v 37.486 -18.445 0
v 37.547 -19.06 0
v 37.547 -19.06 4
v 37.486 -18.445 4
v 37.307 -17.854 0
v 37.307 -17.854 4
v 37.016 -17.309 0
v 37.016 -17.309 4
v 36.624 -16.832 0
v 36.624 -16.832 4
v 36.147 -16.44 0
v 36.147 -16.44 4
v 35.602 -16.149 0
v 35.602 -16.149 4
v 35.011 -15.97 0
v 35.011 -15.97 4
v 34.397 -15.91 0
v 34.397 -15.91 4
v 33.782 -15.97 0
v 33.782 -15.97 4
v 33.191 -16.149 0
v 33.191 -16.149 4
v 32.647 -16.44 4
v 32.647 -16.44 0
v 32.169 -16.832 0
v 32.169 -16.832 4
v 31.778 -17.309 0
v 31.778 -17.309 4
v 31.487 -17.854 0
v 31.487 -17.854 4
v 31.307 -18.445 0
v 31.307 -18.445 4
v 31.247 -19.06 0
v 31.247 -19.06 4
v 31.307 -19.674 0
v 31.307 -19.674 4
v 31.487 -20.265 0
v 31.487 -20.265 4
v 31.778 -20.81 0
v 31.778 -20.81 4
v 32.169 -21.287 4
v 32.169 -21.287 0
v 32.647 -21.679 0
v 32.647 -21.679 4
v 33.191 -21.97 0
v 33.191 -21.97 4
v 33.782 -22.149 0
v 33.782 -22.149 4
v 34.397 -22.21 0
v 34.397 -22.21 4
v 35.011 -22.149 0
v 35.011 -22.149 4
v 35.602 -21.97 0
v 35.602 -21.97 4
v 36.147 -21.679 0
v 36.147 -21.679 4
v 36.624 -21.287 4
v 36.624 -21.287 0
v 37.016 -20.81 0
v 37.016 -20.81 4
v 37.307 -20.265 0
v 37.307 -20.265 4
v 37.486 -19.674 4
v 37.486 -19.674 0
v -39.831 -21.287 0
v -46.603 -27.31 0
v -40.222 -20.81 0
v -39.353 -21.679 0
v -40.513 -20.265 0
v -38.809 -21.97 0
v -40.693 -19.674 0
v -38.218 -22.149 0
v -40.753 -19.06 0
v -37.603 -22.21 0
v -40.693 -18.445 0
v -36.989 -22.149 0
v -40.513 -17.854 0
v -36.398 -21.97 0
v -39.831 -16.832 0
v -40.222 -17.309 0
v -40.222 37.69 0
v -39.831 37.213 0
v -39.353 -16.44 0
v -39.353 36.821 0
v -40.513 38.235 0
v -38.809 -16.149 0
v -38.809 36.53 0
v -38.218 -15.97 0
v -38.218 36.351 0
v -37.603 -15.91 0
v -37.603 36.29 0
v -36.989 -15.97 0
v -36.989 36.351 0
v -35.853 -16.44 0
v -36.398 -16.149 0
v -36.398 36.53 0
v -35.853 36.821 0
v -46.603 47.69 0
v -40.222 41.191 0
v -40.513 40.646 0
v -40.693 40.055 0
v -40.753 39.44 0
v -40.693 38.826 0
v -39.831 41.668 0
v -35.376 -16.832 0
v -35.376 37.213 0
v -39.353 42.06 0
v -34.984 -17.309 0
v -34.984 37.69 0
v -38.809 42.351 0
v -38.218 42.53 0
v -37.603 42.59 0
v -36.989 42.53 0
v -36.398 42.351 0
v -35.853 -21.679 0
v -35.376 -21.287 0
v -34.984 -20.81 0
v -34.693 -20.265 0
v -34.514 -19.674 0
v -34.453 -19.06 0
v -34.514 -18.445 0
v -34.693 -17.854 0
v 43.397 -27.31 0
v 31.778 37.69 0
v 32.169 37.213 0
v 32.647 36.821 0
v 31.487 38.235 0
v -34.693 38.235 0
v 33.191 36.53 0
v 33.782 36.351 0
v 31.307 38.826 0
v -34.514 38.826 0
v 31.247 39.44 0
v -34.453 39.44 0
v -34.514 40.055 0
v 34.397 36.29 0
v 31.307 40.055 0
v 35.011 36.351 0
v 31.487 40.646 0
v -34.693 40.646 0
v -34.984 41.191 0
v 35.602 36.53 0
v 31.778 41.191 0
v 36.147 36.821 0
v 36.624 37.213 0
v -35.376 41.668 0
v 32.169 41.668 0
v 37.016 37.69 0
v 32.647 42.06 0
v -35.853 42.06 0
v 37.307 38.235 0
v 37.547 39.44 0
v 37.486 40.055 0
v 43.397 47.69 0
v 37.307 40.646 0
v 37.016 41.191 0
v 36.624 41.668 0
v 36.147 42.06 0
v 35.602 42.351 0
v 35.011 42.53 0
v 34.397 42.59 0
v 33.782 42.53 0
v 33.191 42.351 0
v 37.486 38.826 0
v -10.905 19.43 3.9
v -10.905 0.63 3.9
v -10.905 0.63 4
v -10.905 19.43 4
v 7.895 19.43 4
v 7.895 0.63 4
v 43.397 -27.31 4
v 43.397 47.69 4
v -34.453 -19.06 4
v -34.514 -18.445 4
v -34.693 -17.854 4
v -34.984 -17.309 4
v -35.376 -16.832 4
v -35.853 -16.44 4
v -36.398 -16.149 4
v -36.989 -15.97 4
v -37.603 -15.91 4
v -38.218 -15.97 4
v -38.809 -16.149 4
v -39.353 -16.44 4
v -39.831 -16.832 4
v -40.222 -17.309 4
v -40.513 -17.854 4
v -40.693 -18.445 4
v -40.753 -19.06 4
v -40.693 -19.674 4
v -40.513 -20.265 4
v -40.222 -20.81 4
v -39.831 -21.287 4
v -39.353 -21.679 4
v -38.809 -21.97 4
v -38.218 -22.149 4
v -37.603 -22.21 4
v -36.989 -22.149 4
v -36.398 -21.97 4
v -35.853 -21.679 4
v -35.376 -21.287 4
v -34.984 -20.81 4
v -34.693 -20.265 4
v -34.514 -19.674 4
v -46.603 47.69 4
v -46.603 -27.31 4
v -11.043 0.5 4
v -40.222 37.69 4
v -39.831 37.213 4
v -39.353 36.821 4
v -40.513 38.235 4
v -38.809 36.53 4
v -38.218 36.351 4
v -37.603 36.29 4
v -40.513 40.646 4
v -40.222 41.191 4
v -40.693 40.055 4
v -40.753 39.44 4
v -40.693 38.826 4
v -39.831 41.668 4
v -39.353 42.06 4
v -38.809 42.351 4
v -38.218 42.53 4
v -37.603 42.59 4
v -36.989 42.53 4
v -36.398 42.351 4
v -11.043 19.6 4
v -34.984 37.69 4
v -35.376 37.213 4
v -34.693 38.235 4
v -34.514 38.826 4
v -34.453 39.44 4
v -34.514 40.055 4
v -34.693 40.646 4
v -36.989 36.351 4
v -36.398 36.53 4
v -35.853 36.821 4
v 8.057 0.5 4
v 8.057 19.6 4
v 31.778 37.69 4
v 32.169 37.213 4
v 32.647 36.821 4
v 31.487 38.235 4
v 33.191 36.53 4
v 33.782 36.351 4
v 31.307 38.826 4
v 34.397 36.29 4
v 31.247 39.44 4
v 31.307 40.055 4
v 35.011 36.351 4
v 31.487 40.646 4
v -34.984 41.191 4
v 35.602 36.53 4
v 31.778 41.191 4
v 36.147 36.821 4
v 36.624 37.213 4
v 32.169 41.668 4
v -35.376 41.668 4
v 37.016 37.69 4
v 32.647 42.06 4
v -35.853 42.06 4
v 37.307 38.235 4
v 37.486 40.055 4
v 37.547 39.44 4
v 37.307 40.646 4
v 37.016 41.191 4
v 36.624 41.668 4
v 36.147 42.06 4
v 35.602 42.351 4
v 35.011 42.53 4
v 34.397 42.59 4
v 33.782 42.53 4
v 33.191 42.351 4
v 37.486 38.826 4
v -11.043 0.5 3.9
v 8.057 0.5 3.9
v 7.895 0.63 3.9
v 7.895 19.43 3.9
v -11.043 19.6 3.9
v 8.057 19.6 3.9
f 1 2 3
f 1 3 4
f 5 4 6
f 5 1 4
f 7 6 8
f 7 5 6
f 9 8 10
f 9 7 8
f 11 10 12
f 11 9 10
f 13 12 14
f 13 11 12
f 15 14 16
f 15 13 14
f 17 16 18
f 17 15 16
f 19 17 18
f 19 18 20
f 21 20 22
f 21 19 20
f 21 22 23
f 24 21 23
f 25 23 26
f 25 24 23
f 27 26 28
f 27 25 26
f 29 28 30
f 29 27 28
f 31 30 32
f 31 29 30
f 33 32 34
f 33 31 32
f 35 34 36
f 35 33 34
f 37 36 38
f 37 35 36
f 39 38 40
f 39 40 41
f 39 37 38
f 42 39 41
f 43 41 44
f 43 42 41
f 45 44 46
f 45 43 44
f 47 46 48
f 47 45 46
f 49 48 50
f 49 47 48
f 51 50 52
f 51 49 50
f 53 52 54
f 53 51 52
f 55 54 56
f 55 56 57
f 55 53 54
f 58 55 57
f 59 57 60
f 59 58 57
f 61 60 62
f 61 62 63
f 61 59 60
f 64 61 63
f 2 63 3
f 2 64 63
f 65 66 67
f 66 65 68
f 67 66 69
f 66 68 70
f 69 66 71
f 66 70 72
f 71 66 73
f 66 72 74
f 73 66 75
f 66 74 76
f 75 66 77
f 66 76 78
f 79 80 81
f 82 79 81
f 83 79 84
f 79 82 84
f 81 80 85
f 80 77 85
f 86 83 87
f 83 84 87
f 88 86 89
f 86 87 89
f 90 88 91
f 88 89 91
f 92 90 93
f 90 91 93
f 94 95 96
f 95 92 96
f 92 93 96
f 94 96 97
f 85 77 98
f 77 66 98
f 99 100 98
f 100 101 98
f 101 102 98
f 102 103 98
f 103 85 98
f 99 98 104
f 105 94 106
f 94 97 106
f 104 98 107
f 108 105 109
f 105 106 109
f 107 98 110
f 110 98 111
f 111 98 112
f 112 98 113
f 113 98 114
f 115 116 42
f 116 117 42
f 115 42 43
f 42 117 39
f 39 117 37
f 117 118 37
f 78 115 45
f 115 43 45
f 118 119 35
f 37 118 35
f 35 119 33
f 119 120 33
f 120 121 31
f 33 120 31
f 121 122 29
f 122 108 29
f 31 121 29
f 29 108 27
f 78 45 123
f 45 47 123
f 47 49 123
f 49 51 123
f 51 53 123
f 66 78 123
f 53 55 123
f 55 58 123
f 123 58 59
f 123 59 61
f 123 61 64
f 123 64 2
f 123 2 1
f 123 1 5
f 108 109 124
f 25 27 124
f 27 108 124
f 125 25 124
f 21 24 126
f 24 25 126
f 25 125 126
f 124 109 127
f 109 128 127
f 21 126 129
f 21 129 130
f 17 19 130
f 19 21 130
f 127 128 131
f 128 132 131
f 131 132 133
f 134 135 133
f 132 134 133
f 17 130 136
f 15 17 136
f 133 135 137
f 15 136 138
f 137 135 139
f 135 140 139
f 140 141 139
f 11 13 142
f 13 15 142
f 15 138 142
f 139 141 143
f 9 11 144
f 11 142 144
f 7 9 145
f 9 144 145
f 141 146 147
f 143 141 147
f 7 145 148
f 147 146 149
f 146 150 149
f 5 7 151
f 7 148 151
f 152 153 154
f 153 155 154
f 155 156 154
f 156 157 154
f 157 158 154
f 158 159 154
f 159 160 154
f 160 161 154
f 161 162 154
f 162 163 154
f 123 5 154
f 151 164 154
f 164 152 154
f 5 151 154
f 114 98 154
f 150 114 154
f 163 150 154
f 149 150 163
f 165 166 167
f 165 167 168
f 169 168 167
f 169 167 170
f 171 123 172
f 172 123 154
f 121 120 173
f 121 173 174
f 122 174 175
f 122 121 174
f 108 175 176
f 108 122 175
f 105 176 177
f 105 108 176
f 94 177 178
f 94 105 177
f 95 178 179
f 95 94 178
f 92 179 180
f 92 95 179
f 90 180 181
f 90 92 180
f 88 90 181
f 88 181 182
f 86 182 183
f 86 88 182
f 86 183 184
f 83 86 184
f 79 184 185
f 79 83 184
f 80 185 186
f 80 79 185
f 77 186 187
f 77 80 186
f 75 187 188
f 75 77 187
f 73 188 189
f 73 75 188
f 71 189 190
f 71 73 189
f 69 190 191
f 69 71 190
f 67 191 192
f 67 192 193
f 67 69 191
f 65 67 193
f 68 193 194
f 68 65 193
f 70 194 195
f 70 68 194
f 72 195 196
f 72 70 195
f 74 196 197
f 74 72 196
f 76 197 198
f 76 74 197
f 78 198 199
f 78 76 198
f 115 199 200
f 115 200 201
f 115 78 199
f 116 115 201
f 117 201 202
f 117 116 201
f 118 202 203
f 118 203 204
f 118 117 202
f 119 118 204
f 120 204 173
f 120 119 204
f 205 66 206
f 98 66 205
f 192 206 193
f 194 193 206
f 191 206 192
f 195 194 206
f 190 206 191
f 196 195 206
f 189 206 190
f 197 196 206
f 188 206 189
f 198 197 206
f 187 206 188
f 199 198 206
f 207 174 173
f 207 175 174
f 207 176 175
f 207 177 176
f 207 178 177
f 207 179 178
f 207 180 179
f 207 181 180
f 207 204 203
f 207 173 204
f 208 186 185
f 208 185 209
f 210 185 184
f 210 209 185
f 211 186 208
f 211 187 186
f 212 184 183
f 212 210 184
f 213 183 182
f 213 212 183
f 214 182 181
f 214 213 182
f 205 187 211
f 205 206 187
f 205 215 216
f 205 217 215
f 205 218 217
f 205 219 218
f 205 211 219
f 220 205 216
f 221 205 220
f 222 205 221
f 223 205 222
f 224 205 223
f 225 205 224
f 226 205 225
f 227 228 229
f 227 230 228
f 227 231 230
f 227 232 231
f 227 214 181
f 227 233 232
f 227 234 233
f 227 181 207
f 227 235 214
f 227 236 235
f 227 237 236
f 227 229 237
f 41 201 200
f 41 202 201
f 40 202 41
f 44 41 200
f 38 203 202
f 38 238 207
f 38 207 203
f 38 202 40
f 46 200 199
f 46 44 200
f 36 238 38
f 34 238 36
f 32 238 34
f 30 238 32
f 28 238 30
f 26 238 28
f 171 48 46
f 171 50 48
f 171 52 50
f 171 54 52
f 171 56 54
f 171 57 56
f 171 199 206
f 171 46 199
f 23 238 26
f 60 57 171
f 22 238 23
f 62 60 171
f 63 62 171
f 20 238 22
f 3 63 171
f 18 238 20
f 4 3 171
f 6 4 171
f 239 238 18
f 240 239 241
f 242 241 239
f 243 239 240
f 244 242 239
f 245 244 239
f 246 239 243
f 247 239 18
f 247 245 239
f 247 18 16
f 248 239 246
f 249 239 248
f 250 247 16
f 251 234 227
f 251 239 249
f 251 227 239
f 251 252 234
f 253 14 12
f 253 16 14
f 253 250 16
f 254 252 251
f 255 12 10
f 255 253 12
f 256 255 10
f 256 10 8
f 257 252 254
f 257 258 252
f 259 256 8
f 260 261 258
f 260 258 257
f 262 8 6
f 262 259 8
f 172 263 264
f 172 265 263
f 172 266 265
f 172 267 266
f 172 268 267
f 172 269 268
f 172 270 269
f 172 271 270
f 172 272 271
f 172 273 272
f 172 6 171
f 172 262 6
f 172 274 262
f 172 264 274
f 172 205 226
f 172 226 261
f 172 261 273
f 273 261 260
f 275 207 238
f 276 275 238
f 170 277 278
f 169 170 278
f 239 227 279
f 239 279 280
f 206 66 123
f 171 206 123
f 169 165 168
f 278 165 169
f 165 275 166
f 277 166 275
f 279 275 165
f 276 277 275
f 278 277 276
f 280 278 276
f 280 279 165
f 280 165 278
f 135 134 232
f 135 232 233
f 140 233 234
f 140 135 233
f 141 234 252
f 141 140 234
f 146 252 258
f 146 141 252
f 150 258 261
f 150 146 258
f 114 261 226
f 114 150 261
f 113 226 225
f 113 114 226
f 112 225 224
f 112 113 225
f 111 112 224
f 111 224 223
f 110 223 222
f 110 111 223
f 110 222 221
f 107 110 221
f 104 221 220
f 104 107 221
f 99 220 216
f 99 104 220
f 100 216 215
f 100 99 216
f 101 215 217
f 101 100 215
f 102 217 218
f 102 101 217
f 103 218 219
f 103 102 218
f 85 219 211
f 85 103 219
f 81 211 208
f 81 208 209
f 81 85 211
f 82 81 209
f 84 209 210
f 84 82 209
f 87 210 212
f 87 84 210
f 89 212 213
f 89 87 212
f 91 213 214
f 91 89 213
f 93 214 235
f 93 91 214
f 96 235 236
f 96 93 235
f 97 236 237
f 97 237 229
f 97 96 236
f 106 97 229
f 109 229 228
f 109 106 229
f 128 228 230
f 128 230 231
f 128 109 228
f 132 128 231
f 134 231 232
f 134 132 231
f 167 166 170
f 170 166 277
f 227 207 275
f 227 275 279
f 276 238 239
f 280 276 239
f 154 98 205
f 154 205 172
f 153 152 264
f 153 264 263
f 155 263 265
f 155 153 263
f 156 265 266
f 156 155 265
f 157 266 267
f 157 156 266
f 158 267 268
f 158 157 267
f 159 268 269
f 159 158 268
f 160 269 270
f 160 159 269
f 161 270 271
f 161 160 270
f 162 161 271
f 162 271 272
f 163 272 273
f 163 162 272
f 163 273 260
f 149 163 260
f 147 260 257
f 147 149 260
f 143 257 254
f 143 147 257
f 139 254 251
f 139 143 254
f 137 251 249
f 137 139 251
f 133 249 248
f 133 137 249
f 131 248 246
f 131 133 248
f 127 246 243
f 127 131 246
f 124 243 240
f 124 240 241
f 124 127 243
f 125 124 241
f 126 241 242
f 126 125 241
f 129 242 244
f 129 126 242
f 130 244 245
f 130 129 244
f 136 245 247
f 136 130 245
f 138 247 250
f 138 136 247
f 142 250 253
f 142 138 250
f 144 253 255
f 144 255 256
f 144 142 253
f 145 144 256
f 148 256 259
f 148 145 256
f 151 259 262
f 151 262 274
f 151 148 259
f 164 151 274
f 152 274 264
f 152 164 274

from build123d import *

# Parameters (mm, degrees)
F1_W     = 90
F1_H     = 75
F1_R     = 3.15
F2_DEPTH = 4
F3_W     = 19.1
F3_H     = 19.1
F4_W     = 19
F4_H     = 19
F4_W_2   = 19.1
F4_H_2   = 19.1
F5_DEPTH = 0.1
F6_W     = 18.8
F6_H     = 18.8
F7_DEPTH = 0.1


with BuildPart() as f2:
    # F1 (on face) → F2 (new body)
    with BuildSketch(Plane.XY):
        with Locations((-1.603169, 10.190485)):
            Rectangle(F1_W, F1_H)
        with Locations((-37.603169, -19.059515)):
            Circle(F1_R, mode=Mode.SUBTRACT)
        with Locations((34.396831, -19.059515)):
            Circle(F1_R, mode=Mode.SUBTRACT)
        with Locations((-37.603169, 39.440485)):
            Circle(F1_R, mode=Mode.SUBTRACT)
        with Locations((34.396831, 39.440485)):
            Circle(F1_R, mode=Mode.SUBTRACT)
    extrude(amount=F2_DEPTH)

    # F3 (on face) + F4 (on face) → F5 (cut)
    with BuildSketch(Plane.XY.offset(4)):
        with Locations((-1.493169, 10.050485)):
            Rectangle(F3_W, F3_H)
    with BuildSketch(Plane.XY.offset(4)):
        with Locations((-1.496693, 10.04078)):
            Rectangle(F4_W, F4_H)
        with Locations((-1.493169, 10.050485)):
            Rectangle(F4_W_2, F4_H_2)
        with Locations((-1.496693, 10.04078)):
            Rectangle(F4_W, F4_H, mode=Mode.SUBTRACT)
    extrude(amount=-F5_DEPTH, mode=Mode.SUBTRACT)

    # F6 (on face) → F7 (join)
    with BuildSketch(Plane.XY.offset(3.9)):
        with Locations((-1.504565, 10.029633)):
            Rectangle(F6_W, F6_H)
    extrude(amount=F7_DEPTH)


solid = f2.part
